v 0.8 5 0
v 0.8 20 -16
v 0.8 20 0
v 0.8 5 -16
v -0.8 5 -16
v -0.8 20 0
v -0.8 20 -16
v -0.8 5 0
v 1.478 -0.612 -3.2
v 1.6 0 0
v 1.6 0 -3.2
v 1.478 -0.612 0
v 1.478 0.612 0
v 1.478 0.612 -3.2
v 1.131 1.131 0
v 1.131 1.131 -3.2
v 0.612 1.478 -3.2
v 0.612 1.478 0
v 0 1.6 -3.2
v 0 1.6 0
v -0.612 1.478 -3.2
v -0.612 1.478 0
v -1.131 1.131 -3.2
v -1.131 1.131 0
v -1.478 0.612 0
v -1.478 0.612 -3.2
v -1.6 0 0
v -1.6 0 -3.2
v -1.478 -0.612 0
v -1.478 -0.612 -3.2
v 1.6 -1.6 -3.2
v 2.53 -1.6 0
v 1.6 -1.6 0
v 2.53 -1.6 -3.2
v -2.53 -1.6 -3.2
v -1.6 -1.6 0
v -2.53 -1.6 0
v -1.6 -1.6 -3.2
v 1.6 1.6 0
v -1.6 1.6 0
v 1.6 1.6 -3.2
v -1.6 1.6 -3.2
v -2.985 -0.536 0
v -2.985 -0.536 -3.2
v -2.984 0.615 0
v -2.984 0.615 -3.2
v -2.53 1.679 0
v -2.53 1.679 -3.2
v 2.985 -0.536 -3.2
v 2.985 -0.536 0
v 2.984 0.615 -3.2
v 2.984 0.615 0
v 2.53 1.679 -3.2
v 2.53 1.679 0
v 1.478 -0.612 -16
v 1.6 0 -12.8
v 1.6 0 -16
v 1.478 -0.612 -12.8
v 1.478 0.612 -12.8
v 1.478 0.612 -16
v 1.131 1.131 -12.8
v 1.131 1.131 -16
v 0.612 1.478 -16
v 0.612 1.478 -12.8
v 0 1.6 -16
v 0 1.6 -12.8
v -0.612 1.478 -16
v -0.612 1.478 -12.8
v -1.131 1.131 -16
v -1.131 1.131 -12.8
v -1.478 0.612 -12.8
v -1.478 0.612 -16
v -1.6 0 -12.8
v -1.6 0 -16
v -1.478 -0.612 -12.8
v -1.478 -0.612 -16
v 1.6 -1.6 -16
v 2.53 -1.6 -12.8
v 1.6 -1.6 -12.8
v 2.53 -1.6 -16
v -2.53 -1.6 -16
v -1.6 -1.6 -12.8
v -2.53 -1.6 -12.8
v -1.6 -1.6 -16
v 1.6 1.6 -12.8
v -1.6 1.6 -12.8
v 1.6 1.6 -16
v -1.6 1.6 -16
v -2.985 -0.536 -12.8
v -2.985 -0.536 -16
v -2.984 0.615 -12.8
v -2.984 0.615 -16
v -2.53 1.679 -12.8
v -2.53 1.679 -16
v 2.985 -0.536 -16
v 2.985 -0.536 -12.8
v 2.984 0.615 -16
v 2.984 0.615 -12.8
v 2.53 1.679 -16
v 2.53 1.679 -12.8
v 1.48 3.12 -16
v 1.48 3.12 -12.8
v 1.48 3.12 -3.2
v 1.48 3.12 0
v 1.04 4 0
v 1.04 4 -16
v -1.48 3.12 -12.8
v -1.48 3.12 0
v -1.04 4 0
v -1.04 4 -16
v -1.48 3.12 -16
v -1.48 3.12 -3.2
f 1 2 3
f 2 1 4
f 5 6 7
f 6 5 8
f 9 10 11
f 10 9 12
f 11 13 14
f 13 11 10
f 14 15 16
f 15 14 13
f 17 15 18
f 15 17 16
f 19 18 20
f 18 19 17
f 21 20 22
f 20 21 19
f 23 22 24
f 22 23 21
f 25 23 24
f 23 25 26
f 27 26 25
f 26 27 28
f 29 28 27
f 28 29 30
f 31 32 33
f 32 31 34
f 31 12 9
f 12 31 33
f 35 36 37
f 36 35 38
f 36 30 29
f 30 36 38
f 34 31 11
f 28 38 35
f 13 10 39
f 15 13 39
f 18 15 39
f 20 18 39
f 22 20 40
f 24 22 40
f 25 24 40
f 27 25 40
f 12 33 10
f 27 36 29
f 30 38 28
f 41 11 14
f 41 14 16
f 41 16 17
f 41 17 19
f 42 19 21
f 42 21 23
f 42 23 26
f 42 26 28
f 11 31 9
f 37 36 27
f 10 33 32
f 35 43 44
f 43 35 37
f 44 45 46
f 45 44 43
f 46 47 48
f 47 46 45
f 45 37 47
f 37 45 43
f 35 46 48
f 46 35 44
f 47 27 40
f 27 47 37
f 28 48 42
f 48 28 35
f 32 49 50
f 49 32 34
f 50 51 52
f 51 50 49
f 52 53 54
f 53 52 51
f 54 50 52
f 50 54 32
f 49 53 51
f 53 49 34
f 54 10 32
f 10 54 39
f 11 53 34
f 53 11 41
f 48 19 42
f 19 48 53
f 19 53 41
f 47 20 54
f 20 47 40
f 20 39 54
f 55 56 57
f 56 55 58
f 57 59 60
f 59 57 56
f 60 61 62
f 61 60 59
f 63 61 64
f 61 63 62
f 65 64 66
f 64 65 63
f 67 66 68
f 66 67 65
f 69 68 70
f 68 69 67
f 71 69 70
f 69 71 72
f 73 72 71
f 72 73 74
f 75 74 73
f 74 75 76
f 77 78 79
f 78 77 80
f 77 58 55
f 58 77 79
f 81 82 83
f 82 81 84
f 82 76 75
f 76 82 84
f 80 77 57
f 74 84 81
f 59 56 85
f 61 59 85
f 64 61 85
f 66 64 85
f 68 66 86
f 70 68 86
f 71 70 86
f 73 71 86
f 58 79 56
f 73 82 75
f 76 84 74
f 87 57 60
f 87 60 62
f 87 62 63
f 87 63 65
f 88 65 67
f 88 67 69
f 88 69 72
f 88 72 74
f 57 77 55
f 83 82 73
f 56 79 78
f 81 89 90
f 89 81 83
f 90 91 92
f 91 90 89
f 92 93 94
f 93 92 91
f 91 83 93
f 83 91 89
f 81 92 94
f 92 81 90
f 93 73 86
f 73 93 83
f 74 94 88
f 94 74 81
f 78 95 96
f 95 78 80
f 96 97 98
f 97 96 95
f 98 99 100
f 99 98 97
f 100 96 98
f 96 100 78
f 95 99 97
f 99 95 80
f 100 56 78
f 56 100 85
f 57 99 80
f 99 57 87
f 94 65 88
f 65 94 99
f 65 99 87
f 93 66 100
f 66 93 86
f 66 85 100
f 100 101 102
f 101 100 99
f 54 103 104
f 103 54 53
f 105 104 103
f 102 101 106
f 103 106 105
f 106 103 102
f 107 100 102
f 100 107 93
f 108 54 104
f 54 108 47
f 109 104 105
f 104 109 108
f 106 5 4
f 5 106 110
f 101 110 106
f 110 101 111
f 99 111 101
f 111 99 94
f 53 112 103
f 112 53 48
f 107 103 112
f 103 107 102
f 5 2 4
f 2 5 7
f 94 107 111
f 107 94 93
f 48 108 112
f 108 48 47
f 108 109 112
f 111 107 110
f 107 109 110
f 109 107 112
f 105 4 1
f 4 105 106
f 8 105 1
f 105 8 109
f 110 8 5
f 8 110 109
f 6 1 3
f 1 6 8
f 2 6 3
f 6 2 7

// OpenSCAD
// file: ../p/5-8edge.scad
use <../lib.scad>
function ldraw_lib__5_8edge() = [
// 0 Circle 0.625
// 0 Name: 5-8edge.dat
// 0 Author: Mark Kennedy [mkennedy]
// 0 !LDRAW_ORG Primitive UPDATE 2017-01
// 0 !LICENSE Licensed under CC BY 4.0 : see CAreadme.txt
// 
// 0 BFC CERTIFY CCW
  [0,"BFC","CERTIFY"],
  [0,"BFC","CCW"],
// 
// 0 !HISTORY 2004-04-22 [PTadmin] Official Update 2004-02
// 0 !HISTORY 2005-12-28 [PTadmin] Official Update 2005-01
// 0 !HISTORY 2007-06-24 [PTadmin] Header formatted for Contributor Agreement
// 0 !HISTORY 2008-07-01 [PTadmin] Official Update 2008-01
// 0 !HISTORY 2017-01-15 [Steffen] BFCed
// 0 !HISTORY 2017-12-30 [PTadmin] Official Update 2017-01
// 
// 
// 2 24 1 0 0 0.9239 0 0.3827
  [2,24,1,0,0,0.9239,0,0.3827],
// 2 24 0.9239 0 0.3827 0.7071 0 0.7071
  [2,24,0.9239,0,0.3827,0.7071,0,0.7071],
// 2 24 0.7071 0 0.7071 0.3827 0 0.9239
  [2,24,0.7071,0,0.7071,0.3827,0,0.9239],
// 2 24 0.3827 0 0.9239 0 0 1
  [2,24,0.3827,0,0.9239,0,0,1],
// 2 24 0 0 1 -0.3827 0 0.9239
  [2,24,0,0,1,-0.3827,0,0.9239],
// 2 24 -0.3827 0 0.9239 -0.7071 0 0.7071
  [2,24,-0.3827,0,0.9239,-0.7071,0,0.7071],
// 2 24 -0.7071 0 0.7071 -0.9239 0 0.3827
  [2,24,-0.7071,0,0.7071,-0.9239,0,0.3827],
// 2 24 -0.9239 0 0.3827 -1 0 0
  [2,24,-0.9239,0,0.3827,-1,0,0],
// 2 24 -1 0 0 -0.9239 0 -0.3827
  [2,24,-1,0,0,-0.9239,0,-0.3827],
// 2 24 -0.9239 0 -0.3827 -0.7071 0 -0.7071
  [2,24,-0.9239,0,-0.3827,-0.7071,0,-0.7071],
];
module ldraw_lib__5_8edge(step=0, col=false, unit=2/5, alt=false, line=0.2, solid=!$preview)
    makepoly(ldraw_lib__5_8edge(), step=step, col=col, unit=unit, alt=alt, line=line, solid=solid);
ldraw_lib__5_8edge(line=0.2);
// file: ../p/5-8cyli.scad
use <../lib.scad>
function ldraw_lib__5_8cyli() = [
// 0 Cylinder 0.625
// 0 Name: 5-8cyli.dat
// 0 Author: Mark Kennedy [mkennedy]
// 0 !LDRAW_ORG Primitive UPDATE 2005-01
// 0 !LICENSE Licensed under CC BY 4.0 : see CAreadme.txt
// 
// 0 BFC CERTIFY CCW
  [0,"BFC","CERTIFY"],
  [0,"BFC","CCW"],
// 
// 0 !HISTORY 2004-04-22 [PTadmin] Official Update 2004-02
// 0 !HISTORY 2004-12-11 [nielsk] Recreated using Primitive Generator, Edge lines fixed, BFC changed to CCW
// 0 !HISTORY 2005-12-28 [PTadmin] Official Update 2005-01
// 0 !HISTORY 2007-06-24 [PTadmin] Header formatted for Contributor Agreement
// 0 !HISTORY 2008-07-01 [PTadmin] Official Update 2008-01
// 
// 
// 4 16 .9239 1 .3827 .9239 0 .3827 1 0 0 1 1 0
  [4,16,.9239,1,.3827,.9239,0,.3827,1,0,0,1,1,0],
// 4 16 .7071 1 .7071 .7071 0 .7071 .9239 0 .3827 .9239 1 .3827
  [4,16,.7071,1,.7071,.7071,0,.7071,.9239,0,.3827,.9239,1,.3827],
// 4 16 .3827 1 .9239 .3827 0 .9239 .7071 0 .7071 .7071 1 .7071
  [4,16,.3827,1,.9239,.3827,0,.9239,.7071,0,.7071,.7071,1,.7071],
// 4 16 0 1 1 0 0 1 .3827 0 .9239 .3827 1 .9239
  [4,16,0,1,1,0,0,1,.3827,0,.9239,.3827,1,.9239],
// 4 16 -.3827 1 .9239 -.3827 0 .9239 0 0 1 0 1 1
  [4,16,-.3827,1,.9239,-.3827,0,.9239,0,0,1,0,1,1],
// 4 16 -.7071 1 .7071 -.7071 0 .7071 -.3827 0 .9239 -.3827 1 .9239
  [4,16,-.7071,1,.7071,-.7071,0,.7071,-.3827,0,.9239,-.3827,1,.9239],
// 4 16 -.9239 1 .3827 -.9239 0 .3827 -.7071 0 .7071 -.7071 1 .7071
  [4,16,-.9239,1,.3827,-.9239,0,.3827,-.7071,0,.7071,-.7071,1,.7071],
// 4 16 -1 1 0 -1 0 0 -.9239 0 .3827 -.9239 1 .3827
  [4,16,-1,1,0,-1,0,0,-.9239,0,.3827,-.9239,1,.3827],
// 4 16 -.9239 1 -.3827 -.9239 0 -.3827 -1 0 0 -1 1 0
  [4,16,-.9239,1,-.3827,-.9239,0,-.3827,-1,0,0,-1,1,0],
// 4 16 -.7071 1 -.7071 -.7071 0 -.7071 -.9239 0 -.3827 -.9239 1 -.3827
  [4,16,-.7071,1,-.7071,-.7071,0,-.7071,-.9239,0,-.3827,-.9239,1,-.3827],
// 0
// 5 24 1 1 0 1 0 0 1 1 -.4142 .9239 1 .3827
  [5,24,1,1,0,1,0,0,1,1,-.4142,.9239,1,.3827],
// 5 24 .9239 1 .3827 .9239 0 .3827 1 1 0 .7071 1 .7071
  [5,24,.9239,1,.3827,.9239,0,.3827,1,1,0,.7071,1,.7071],
// 5 24 .7071 1 .7071 .7071 0 .7071 .9239 1 .3827 .3827 1 .9239
  [5,24,.7071,1,.7071,.7071,0,.7071,.9239,1,.3827,.3827,1,.9239],
// 5 24 .3827 1 .9239 .3827 0 .9239 .7071 1 .7071 0 1 1
  [5,24,.3827,1,.9239,.3827,0,.9239,.7071,1,.7071,0,1,1],
// 5 24 0 1 1 0 0 1 .3827 1 .9239 -.3827 1 .9239
  [5,24,0,1,1,0,0,1,.3827,1,.9239,-.3827,1,.9239],
// 5 24 -.3827 1 .9239 -.3827 0 .9239 0 1 1 -.7071 1 .7071
  [5,24,-.3827,1,.9239,-.3827,0,.9239,0,1,1,-.7071,1,.7071],
// 5 24 -.7071 1 .7071 -.7071 0 .7071 -.3827 1 .9239 -.9239 1 .3827
  [5,24,-.7071,1,.7071,-.7071,0,.7071,-.3827,1,.9239,-.9239,1,.3827],
// 5 24 -.9239 1 .3827 -.9239 0 .3827 -.7071 1 .7071 -1 1 0
  [5,24,-.9239,1,.3827,-.9239,0,.3827,-.7071,1,.7071,-1,1,0],
// 5 24 -1 1 0 -1 0 0 -.9239 1 .3827 -.9239 1 -.3827
  [5,24,-1,1,0,-1,0,0,-.9239,1,.3827,-.9239,1,-.3827],
// 5 24 -.9239 1 -.3827 -.9239 0 -.3827 -1 1 0 -.7071 1 -.7071
  [5,24,-.9239,1,-.3827,-.9239,0,-.3827,-1,1,0,-.7071,1,-.7071],
// 5 24 -.7071 1 -.7071 -.7071 0 -.7071 -.9239 1 -.3827 -.4142 1 -1
  [5,24,-.7071,1,-.7071,-.7071,0,-.7071,-.9239,1,-.3827,-.4142,1,-1],
// 0
];
module ldraw_lib__5_8cyli(step=0, col=false, unit=2/5, alt=false, line=0.2, solid=!$preview)
    makepoly(ldraw_lib__5_8cyli(), step=step, col=col, unit=unit, alt=alt, line=line, solid=solid);
ldraw_lib__5_8cyli(line=0.2);
// file: ../p/3-16edge.scad
use <../lib.scad>
function ldraw_lib__3_16edge() = [
// 0 Circle 0.1875
// 0 Name: 3-16edge.dat
// 0 Author: Donald Sutter [technog]
// 0 !LDRAW_ORG Primitive UPDATE 2017-01
// 0 !LICENSE Licensed under CC BY 4.0 : see CAreadme.txt
// 
// 0 BFC CERTIFY CCW
  [0,"BFC","CERTIFY"],
  [0,"BFC","CCW"],
// 
// 0 !HISTORY 2004-03-02 [PTadmin] Official Update 2004-01
// 0 !HISTORY 2007-06-24 [PTadmin] Header formatted for Contributor Agreement
// 0 !HISTORY 2008-07-01 [PTadmin] Official Update 2008-01
// 0 !HISTORY 2017-01-15 [Steffen] BFCed
// 0 !HISTORY 2017-12-30 [PTadmin] Official Update 2017-01
// 
// 
// 2 24 1 0 0 0.9239 0 0.3827
  [2,24,1,0,0,0.9239,0,0.3827],
// 2 24 0.9239 0 0.3827 0.7071 0 0.7071
  [2,24,0.9239,0,0.3827,0.7071,0,0.7071],
// 2 24 0.7071 0 0.7071 0.3827 0 0.9239
  [2,24,0.7071,0,0.7071,0.3827,0,0.9239],
];
module ldraw_lib__3_16edge(step=0, col=false, unit=2/5, alt=false, line=0.2, solid=!$preview)
    makepoly(ldraw_lib__3_16edge(), step=step, col=col, unit=unit, alt=alt, line=line, solid=solid);
ldraw_lib__3_16edge(line=0.2);
// file: ../p/3-16cyli.scad
use <../lib.scad>
function ldraw_lib__3_16cyli() = [
// 0 Cylinder 0.1875
// 0 Name: 3-16cyli.dat
// 0 Author: Mark Kennedy [mkennedy]
// 0 !LDRAW_ORG Primitive UPDATE 2005-01
// 0 !LICENSE Licensed under CC BY 4.0 : see CAreadme.txt
// 
// 0 BFC CERTIFY CCW
  [0,"BFC","CERTIFY"],
  [0,"BFC","CCW"],
// 
// 0 !HISTORY 2004-03-02 [PTadmin] Official Update 2004-01
// 0 !HISTORY 2004-12-11 [nielsk] Recreated using Primitive Generator, Edge lines fixed, BFC changed to CCW
// 0 !HISTORY 2005-12-28 [PTadmin] Official Update 2005-01
// 0 !HISTORY 2007-06-24 [PTadmin] Header formatted for Contributor Agreement
// 0 !HISTORY 2008-07-01 [PTadmin] Official Update 2008-01
// 
// 
// 4 16 .9239 1 .3827 .9239 0 .3827 1 0 0 1 1 0
  [4,16,.9239,1,.3827,.9239,0,.3827,1,0,0,1,1,0],
// 4 16 .7071 1 .7071 .7071 0 .7071 .9239 0 .3827 .9239 1 .3827
  [4,16,.7071,1,.7071,.7071,0,.7071,.9239,0,.3827,.9239,1,.3827],
// 4 16 .3827 1 .9239 .3827 0 .9239 .7071 0 .7071 .7071 1 .7071
  [4,16,.3827,1,.9239,.3827,0,.9239,.7071,0,.7071,.7071,1,.7071],
// 5 24 1 1 0 1 0 0 1 1 -.4142 .9239 1 .3827
  [5,24,1,1,0,1,0,0,1,1,-.4142,.9239,1,.3827],
// 5 24 .9239 1 .3827 .9239 0 .3827 1 1 0 .7071 1 .7071
  [5,24,.9239,1,.3827,.9239,0,.3827,1,1,0,.7071,1,.7071],
// 5 24 .7071 1 .7071 .7071 0 .7071 .9239 1 .3827 .3827 1 .9239
  [5,24,.7071,1,.7071,.7071,0,.7071,.9239,1,.3827,.3827,1,.9239],
// 5 24 .3827 1 .9239 .3827 0 .9239 .7071 1 .7071 0 1 1.0824
  [5,24,.3827,1,.9239,.3827,0,.9239,.7071,1,.7071,0,1,1.0824],
// 0
];
module ldraw_lib__3_16cyli(step=0, col=false, unit=2/5, alt=false, line=0.2, solid=!$preview)
    makepoly(ldraw_lib__3_16cyli(), step=step, col=col, unit=unit, alt=alt, line=line, solid=solid);
ldraw_lib__3_16cyli(line=0.2);
// file: ../p/box2-5.scad
use <../lib.scad>
function ldraw_lib__box2_5() = [
// 0 Box with 2 Faces without 5 Edges
// 0 Name: box2-5.dat
// 0 Author: Steffen [Steffen]
// 0 !LDRAW_ORG Primitive UPDATE 2003-03
// 0 !LICENSE Licensed under CC BY 4.0 : see CAreadme.txt
// 
// 0 BFC CERTIFY CCW
  [0,"BFC","CERTIFY"],
  [0,"BFC","CCW"],
// 
// 0 !HISTORY 2003-12-19 [PTadmin] Official Update 2003-03
// 0 !HISTORY 2007-06-24 [PTadmin] Header formatted for Contributor Agreement
// 0 !HISTORY 2008-07-01 [PTadmin] Official Update 2008-01
// 
// 
// 2 24 1 1 1 -1 1 1
  [2,24,1,1,1,-1,1,1],
// 2 24 1 1 -1 -1 1 -1
  [2,24,1,1,-1,-1,1,-1],
// 2 24 1 -1 1 -1 -1 1
  [2,24,1,-1,1,-1,-1,1],
// 2 24 -1 -1 1 -1 1 1
  [2,24,-1,-1,1,-1,1,1],
// 2 24 1 -1 1 1 1 1
  [2,24,1,-1,1,1,1,1],
// 2 24 -1 1 -1 -1 1 1
  [2,24,-1,1,-1,-1,1,1],
// 2 24 1 1 -1 1 1 1
  [2,24,1,1,-1,1,1,1],
// 4 16 1 1 1 1 1 -1 -1 1 -1 -1 1 1
  [4,16,1,1,1,1,1,-1,-1,1,-1,-1,1,1],
// 4 16 1 1 1 -1 1 1 -1 -1 1 1 -1 1
  [4,16,1,1,1,-1,1,1,-1,-1,1,1,-1,1],
// 0
];
module ldraw_lib__box2_5(step=0, col=false, unit=2/5, alt=false, line=0.2, solid=!$preview)
    makepoly(ldraw_lib__box2_5(), step=step, col=col, unit=unit, alt=alt, line=line, solid=solid);
ldraw_lib__box2_5(line=0.2);
// file: ../p/5-8cylo.scad
use <../lib.scad>
use <5-8cyli.scad>
use <5-8edge.scad>
function ldraw_lib__5_8cylo() = [
// 0 Cylinder Open 0.625
// 0 Name: 5-8cylo.dat
// 0 Author: J.C. Tchang [tchang]
// 0 !LDRAW_ORG Primitive UPDATE 2013-01
// 0 !LICENSE Licensed under CC BY 4.0 : see CAreadme.txt
// 
// 0 BFC CERTIFY CCW
  [0,"BFC","CERTIFY"],
  [0,"BFC","CCW"],
// 
// 0 !HISTORY 2013-07-21 [PTadmin] Official Update 2013-01
// 
// 
// 1 16 0 0 0 1 0 0 0 1 0 0 0 1 5-8edge.dat
  [1,16,0,0,0,1,0,0,0,1,0,0,0,1, ldraw_lib__5_8edge()],
// 1 16 0 1 0 1 0 0 0 1 0 0 0 1 5-8edge.dat
  [1,16,0,1,0,1,0,0,0,1,0,0,0,1, ldraw_lib__5_8edge()],
// 1 16 0 0 0 1 0 0 0 1 0 0 0 1 5-8cyli.dat
  [1,16,0,0,0,1,0,0,0,1,0,0,0,1, ldraw_lib__5_8cyli()],
];
module ldraw_lib__5_8cylo(step=0, col=false, unit=2/5, alt=false, line=0.2, solid=!$preview)
    makepoly(ldraw_lib__5_8cylo(), step=step, col=col, unit=unit, alt=alt, line=line, solid=solid);
ldraw_lib__5_8cylo(line=0.2);
// file: ../p/3-16cylo.scad
use <../lib.scad>
use <3-16cyli.scad>
use <3-16edge.scad>
function ldraw_lib__3_16cylo() = [
// 0 Cylinder Open 0.1875
// 0 Name: 3-16cylo.dat
// 0 Author: J.C. Tchang [tchang]
// 0 !LDRAW_ORG Primitive UPDATE 2013-01
// 0 !LICENSE Licensed under CC BY 4.0 : see CAreadme.txt
// 
// 0 BFC CERTIFY CCW
  [0,"BFC","CERTIFY"],
  [0,"BFC","CCW"],
// 
// 0 !HISTORY 2013-07-21 [PTadmin] Official Update 2013-01
// 
// 
// 1 16 0 0 0 1 0 0 0 1 0 0 0 1 3-16edge.dat
  [1,16,0,0,0,1,0,0,0,1,0,0,0,1, ldraw_lib__3_16edge()],
// 1 16 0 1 0 1 0 0 0 1 0 0 0 1 3-16edge.dat
  [1,16,0,1,0,1,0,0,0,1,0,0,0,1, ldraw_lib__3_16edge()],
// 1 16 0 0 0 1 0 0 0 1 0 0 0 1 3-16cyli.dat
  [1,16,0,0,0,1,0,0,0,1,0,0,0,1, ldraw_lib__3_16cyli()],
];
module ldraw_lib__3_16cylo(step=0, col=false, unit=2/5, alt=false, line=0.2, solid=!$preview)
    makepoly(ldraw_lib__3_16cylo(), step=step, col=col, unit=unit, alt=alt, line=line, solid=solid);
ldraw_lib__3_16cylo(line=0.2);
// file: ../p/3-16chrd.scad
use <../lib.scad>
function ldraw_lib__3_16chrd() = [
// 0 Chord 0.1875
// 0 Name: 3-16chrd.dat
// 0 Author: Niels Karsdorp [nielsk]
// 0 !LDRAW_ORG Primitive UPDATE 2009-01
// 0 !LICENSE Licensed under CC BY 4.0 : see CAreadme.txt
// 
// 0 BFC CERTIFY CCW
  [0,"BFC","CERTIFY"],
  [0,"BFC","CCW"],
// 
// 0 !HISTORY 2009-05-02 [PTadmin] Official Update 2009-01
// 
// 
// 4 16 1 0 0 0.9239 0 0.3827 0.7071 0 0.7071 0.3827 0 0.9239
  [4,16,1,0,0,0.9239,0,0.3827,0.7071,0,0.7071,0.3827,0,0.9239],
// 0
// 
];
module ldraw_lib__3_16chrd(step=0, col=false, unit=2/5, alt=false, line=0.2, solid=!$preview)
    makepoly(ldraw_lib__3_16chrd(), step=step, col=col, unit=unit, alt=alt, line=line, solid=solid);
ldraw_lib__3_16chrd(line=0.2);
// file: ../p/2-4ndis.scad
use <../lib.scad>
function ldraw_lib__2_4ndis() = [
// 0 Disc Negative 0.5
// 0 Name: 2-4ndis.dat
// 0 Author: James Jessiman
// 0 !LDRAW_ORG Primitive UPDATE 2012-01
// 0 !LICENSE Licensed under CC BY 4.0 : see CAreadme.txt
// 
// 0 BFC CERTIFY CCW
  [0,"BFC","CERTIFY"],
  [0,"BFC","CCW"],
// 
// 0 !HISTORY 2002-03-23 [sbliss] Added BFC statement; compacted code
// 0 !HISTORY 2002-04-25 [PTadmin] Official Update 2002-02
// 0 !HISTORY 2007-06-24 [PTadmin] Header formatted for Contributor Agreement
// 0 !HISTORY 2008-07-01 [PTadmin] Official Update 2008-01
// 0 !HISTORY 2012-02-16 [Philo] Changed to CCW
// 0 !HISTORY 2012-03-30 [PTadmin] Official Update 2012-01
// 
// 
// 3 16 0.9239 0 0.3827 1 0 0 1 0 1
  [3,16,0.9239,0,0.3827,1,0,0,1,0,1],
// 3 16 0.7071 0 0.7071 0.9239 0 0.3827 1 0 1
  [3,16,0.7071,0,0.7071,0.9239,0,0.3827,1,0,1],
// 3 16 0.3827 0 0.9239 0.7071 0 0.7071 1 0 1
  [3,16,0.3827,0,0.9239,0.7071,0,0.7071,1,0,1],
// 3 16 0 0 1 0.3827 0 0.9239 1 0 1
  [3,16,0,0,1,0.3827,0,0.9239,1,0,1],
// 3 16 -0.3827 0 0.9239 0 0 1 -1 0 1
  [3,16,-0.3827,0,0.9239,0,0,1,-1,0,1],
// 3 16 -0.7071 0 0.7071 -0.3827 0 0.9239 -1 0 1
  [3,16,-0.7071,0,0.7071,-0.3827,0,0.9239,-1,0,1],
// 3 16 -0.9239 0 0.3827 -0.7071 0 0.7071 -1 0 1
  [3,16,-0.9239,0,0.3827,-0.7071,0,0.7071,-1,0,1],
// 3 16 -1 0 0 -0.9239 0 0.3827 -1 0 1
  [3,16,-1,0,0,-0.9239,0,0.3827,-1,0,1],
];
module ldraw_lib__2_4ndis(step=0, col=false, unit=2/5, alt=false, line=0.2, solid=!$preview)
    makepoly(ldraw_lib__2_4ndis(), step=step, col=col, unit=unit, alt=alt, line=line, solid=solid);
ldraw_lib__2_4ndis(line=0.2);
// file: ../p/1-16ndis.scad
use <../lib.scad>
function ldraw_lib__1_16ndis() = [
// 0 Disc Negative 0.0625
// 0 Name: 1-16ndis.dat
// 0 Author: Niels Karsdorp [nielsk]
// 0 !LDRAW_ORG Primitive UPDATE 2009-01
// 0 !LICENSE Licensed under CC BY 4.0 : see CAreadme.txt
// 
// 0 BFC CERTIFY CCW
  [0,"BFC","CERTIFY"],
  [0,"BFC","CCW"],
// 
// 0 !HISTORY 2009-05-02 [PTadmin] Official Update 2009-01
// 
// 
// 3 16 1 0 0 1 0 1 0.9239 0 0.3827
  [3,16,1,0,0,1,0,1,0.9239,0,0.3827],
// 0
];
module ldraw_lib__1_16ndis(step=0, col=false, unit=2/5, alt=false, line=0.2, solid=!$preview)
    makepoly(ldraw_lib__1_16ndis(), step=step, col=col, unit=unit, alt=alt, line=line, solid=solid);
ldraw_lib__1_16ndis(line=0.2);
// file: ../p/clip13.scad
use <../lib.scad>
use <1-16ndis.scad>
use <2-4ndis.scad>
use <3-16chrd.scad>
use <3-16cylo.scad>
use <5-8cylo.scad>
use <box2-5.scad>
function ldraw_lib__clip13() = [
// 0 Clip Minimal (Thick C-Clip)
// 0 Name: clip13.dat
// 0 Author: Philippe Hurbain [Philo]
// 0 !LDRAW_ORG Primitive UPDATE 2017-01
// 0 !LICENSE Licensed under CC BY 4.0 : see CAreadme.txt
// 
// 0 BFC CERTIFY CCW
  [0,"BFC","CERTIFY"],
  [0,"BFC","CCW"],
// 
// 0 !HISTORY 2017-12-30 [PTadmin] Official Update 2017-01
// 
// 
// 0 BFC INVERTNEXT
  [0,"BFC","INVERTNEXT"],
// 1 16 0 4 0 3.69552 0 1.53073 0 -8 0 -1.53073 0 3.69552 5-8cylo.dat
  [1,16,0,4,0,3.69552,0,1.53073,0,-8,0,-1.53073,0,3.69552, ldraw_lib__5_8cylo()],
// 1 16 5.011 0 -2.765 0 0.1522 -1.16272 4 0 0 0 -1.2346 0 box2-5.dat
  [1,16,5.011,0,-2.765,0,0.1522,-1.16272,4,0,0,0,-1.2346,0, ldraw_lib__box2_5()],
// 1 16 -5.011 0 -2.765 0 -0.1522 1.16272 -4 0 0 0 -1.2346 0 box2-5.dat
  [1,16,-5.011,0,-2.765,0,-0.1522,1.16272,-4,0,0,0,-1.2346,0, ldraw_lib__box2_5()],
// 3 16 6.3254 4 -4 4 4 -4 4 4 0
  [3,16,6.3254,4,-4,4,4,-4,4,4,0],
// 3 16 -4 4 0 -4 4 -4 -6.3254 4 -4
  [3,16,-4,4,0,-4,4,-4,-6.3254,4,-4],
// 1 16 0 -4 0 4 0 0 0 1 0 0 0 4 2-4ndis.dat
  [1,16,0,-4,0,4,0,0,0,1,0,0,0,4, ldraw_lib__2_4ndis()],
// 1 16 0 -4 0 4 0 0 0 1 0 0 0 -4 1-16ndis.dat
  [1,16,0,-4,0,4,0,0,0,1,0,0,0,-4, ldraw_lib__1_16ndis()],
// 1 16 0 -4 0 -4 0 0 0 1 0 0 0 -4 1-16ndis.dat
  [1,16,0,-4,0,-4,0,0,0,1,0,0,0,-4, ldraw_lib__1_16ndis()],
// 1 16 0 4 0 -4 0 0 0 -1 0 0 0 -4 1-16ndis.dat
  [1,16,0,4,0,-4,0,0,0,-1,0,0,0,-4, ldraw_lib__1_16ndis()],
// 1 16 0 4 0 4 0 0 0 -1 0 0 0 4 2-4ndis.dat
  [1,16,0,4,0,4,0,0,0,-1,0,0,0,4, ldraw_lib__2_4ndis()],
// 1 16 0 4 0 4 0 0 0 -1 0 0 0 -4 1-16ndis.dat
  [1,16,0,4,0,4,0,0,0,-1,0,0,0,-4, ldraw_lib__1_16ndis()],
// 3 16 -6.3254 -4 -4 -4 -4 -4 -4 -4 0
  [3,16,-6.3254,-4,-4,-4,-4,-4,-4,-4,0],
// 3 16 4 -4 0 4 -4 -4 6.3254 -4 -4
  [3,16,4,-4,0,4,-4,-4,6.3254,-4,-4],
// 1 16 0 -4 0.098 -6.3254 0 -4.2265 0 8 0 -4.09842 0 6.13371 3-16cylo.dat
  [1,16,0,-4,0.098,-6.3254,0,-4.2265,0,8,0,-4.09842,0,6.13371, ldraw_lib__3_16cylo()],
// 1 16 0 -4 0.098 -6.3254 0 -4.2265 0 1 0 -4.09842 0 6.13371 3-16chrd.dat
  [1,16,0,-4,0.098,-6.3254,0,-4.2265,0,1,0,-4.09842,0,6.13371, ldraw_lib__3_16chrd()],
// 1 16 0 4 0.098 -6.3254 0 -4.2265 0 -1 0 -4.09842 0 6.13371 3-16chrd.dat
  [1,16,0,4,0.098,-6.3254,0,-4.2265,0,-1,0,-4.09842,0,6.13371, ldraw_lib__3_16chrd()],
// 4 16 -6.3259 -4 -3.9996 -4.0001 -4 0 -4 -4 4 -6.3256 -4 4.1965
  [4,16,-6.3259,-4,-3.9996,-4.0001,-4,0,-4,-4,4,-6.3256,-4,4.1965],
// 4 16 -6.3259 4 -3.9996 -6.3256 4 4.1965 -4 4 4 -4.0001 4 0
  [4,16,-6.3259,4,-3.9996,-6.3256,4,4.1965,-4,4,4,-4.0001,4,0],
// 1 16 0 -4 0.098 6.3254 0 4.2265 0 8 0 -4.09842 0 6.13371 3-16cylo.dat
  [1,16,0,-4,0.098,6.3254,0,4.2265,0,8,0,-4.09842,0,6.13371, ldraw_lib__3_16cylo()],
// 1 16 0 -4 0.098 6.3254 0 4.2265 0 1 0 -4.09842 0 6.13371 3-16chrd.dat
  [1,16,0,-4,0.098,6.3254,0,4.2265,0,1,0,-4.09842,0,6.13371, ldraw_lib__3_16chrd()],
// 1 16 0 4 0.098 6.3254 0 4.2265 0 -1 0 -4.09842 0 6.13371 3-16chrd.dat
  [1,16,0,4,0.098,6.3254,0,4.2265,0,-1,0,-4.09842,0,6.13371, ldraw_lib__3_16chrd()],
// 4 16 4 -4 4 4.0001 -4 0 6.3259 -4 -3.9996 6.3256 -4 4.1965
  [4,16,4,-4,4,4.0001,-4,0,6.3259,-4,-3.9996,6.3256,-4,4.1965],
// 4 16 4 4 4 6.3256 4 4.1965 6.3259 4 -3.9996 4.0001 4 0
  [4,16,4,4,4,6.3256,4,4.1965,6.3259,4,-3.9996,4.0001,4,0],
// 4 16 0 4 4.0001 -4 4 4 -6.3256 4 4.1965 6.3256 4 4.1965
  [4,16,0,4,4.0001,-4,4,4,-6.3256,4,4.1965,6.3256,4,4.1965],
// 3 16 0 4 4.0001 6.3256 4 4.1965 4 4 4
  [3,16,0,4,4.0001,6.3256,4,4.1965,4,4,4],
// 4 16 -6.3256 -4 4.1965 -4 -4 4 0 -4 4.0001 6.3256 -4 4.1965
  [4,16,-6.3256,-4,4.1965,-4,-4,4,0,-4,4.0001,6.3256,-4,4.1965],
// 3 16 0 -4 4.0001 4 -4 4 6.3256 -4 4.1965
  [3,16,0,-4,4.0001,4,-4,4,6.3256,-4,4.1965],
];
module ldraw_lib__clip13(step=0, col=false, unit=2/5, alt=false, line=0.2, solid=!$preview)
    makepoly(ldraw_lib__clip13(), step=step, col=col, unit=unit, alt=alt, line=line, solid=solid);
ldraw_lib__clip13(line=0.2);
// file: s/80324s02.scad
use <../../lib.scad>
use <../../p/clip13.scad>
use <../../p/rect.scad>
use <../../p/rect2p.scad>
function ldraw_lib__s__80324s02() = [
// 0 ~Flag  2 x  2 - Clips and bottom side
// 0 Name: s\80324s02.dat
// 0 Author: Vincent Messenet [Cheenzo]
// 0 !LDRAW_ORG Subpart UPDATE 2024-03
// 0 !LICENSE Licensed under CC BY 4.0 : see CAreadme.txt
// 
// 0 BFC CERTIFY CCW
  [0,"BFC","CERTIFY"],
  [0,"BFC","CCW"],
// 
// 0 !HISTORY 2024-04-28 [OrionP] Official Update 2024-03
// 
// 
// 1 16 0 4 0 1 0 0 0 1 0 0 0 1 clip13.dat
  [1,16,0,4,0,1,0,0,0,1,0,0,0,1, ldraw_lib__clip13()],
// 1 16 0 36 0 1 0 0 0 1 0 0 0 1 clip13.dat
  [1,16,0,36,0,1,0,0,0,1,0,0,0,1, ldraw_lib__clip13()],
// 2 24 3.7 40 7.8 2.6 40 10
  [2,24,3.7,40,7.8,2.6,40,10],
// 2 24 2.6 40 10 2 40 12.5
  [2,24,2.6,40,10,2,40,12.5],
// 2 24 6.3256 40 4.1965 3.7 40 7.8
  [2,24,6.3256,40,4.1965,3.7,40,7.8],
// 2 24 6.3256 32 4.1965 3.7 32 7.8
  [2,24,6.3256,32,4.1965,3.7,32,7.8],
// 2 24 6.3256 8 4.1965 3.7 8 7.8
  [2,24,6.3256,8,4.1965,3.7,8,7.8],
// 2 24 6.3256 0 4.1965 3.7 0 7.8
  [2,24,6.3256,0,4.1965,3.7,0,7.8],
// 4 16 3.7 32 7.8 6.3256 32 4.1965 6.3256 40 4.1965 3.7 40 7.8
  [4,16,3.7,32,7.8,6.3256,32,4.1965,6.3256,40,4.1965,3.7,40,7.8],
// 4 16 3.7 0 7.8 6.3256 0 4.1965 6.3256 8 4.1965 3.7 8 7.8
  [4,16,3.7,0,7.8,6.3256,0,4.1965,6.3256,8,4.1965,3.7,8,7.8],
// 3 16 2.6 0 10 3.7 0 7.8 3.7 8 7.8
  [3,16,2.6,0,10,3.7,0,7.8,3.7,8,7.8],
// 3 16 3.7 32 7.8 3.7 40 7.8 2.6 40 10
  [3,16,3.7,32,7.8,3.7,40,7.8,2.6,40,10],
// 2 24 2.6 0 10 3.7 0 7.8
  [2,24,2.6,0,10,3.7,0,7.8],
// 4 16 3.7 8 7.8 3.7 32 7.8 2.6 40 10 2.6 0 10
  [4,16,3.7,8,7.8,3.7,32,7.8,2.6,40,10,2.6,0,10],
// 4 16 -3.7 32 7.8 -6.3256 32 4.1965 6.3256 32 4.1965 3.7 32 7.8
  [4,16,-3.7,32,7.8,-6.3256,32,4.1965,6.3256,32,4.1965,3.7,32,7.8],
// 4 16 6.3256 0 4.1965 3.7 0 7.8 -3.7 0 7.8 -6.3256 0 4.1965
  [4,16,6.3256,0,4.1965,3.7,0,7.8,-3.7,0,7.8,-6.3256,0,4.1965],
// 4 16 3.7 0 7.8 2.6 0 10 -2.6 0 10 -3.7 0 7.8
  [4,16,3.7,0,7.8,2.6,0,10,-2.6,0,10,-3.7,0,7.8],
// 4 16 2 40 12.5 2.6 40 10 -2.6 40 10 -2 40 12.5
  [4,16,2,40,12.5,2.6,40,10,-2.6,40,10,-2,40,12.5],
// 4 16 2.6 40 10 3.7 40 7.8 -3.7 40 7.8 -2.6 40 10
  [4,16,2.6,40,10,3.7,40,7.8,-3.7,40,7.8,-2.6,40,10],
// 4 16 3.7 40 7.8 6.3256 40 4.1965 -6.3256 40 4.1965 -3.7 40 7.8
  [4,16,3.7,40,7.8,6.3256,40,4.1965,-6.3256,40,4.1965,-3.7,40,7.8],
// 4 16 6.3256 8 4.1965 -6.3256 8 4.1965 -3.7 8 7.8 3.7 8 7.8
  [4,16,6.3256,8,4.1965,-6.3256,8,4.1965,-3.7,8,7.8,3.7,8,7.8],
// 1 16 0 20 7.8 -3.7 0 0 0 0 12 0 1 0 rect.dat
  [1,16,0,20,7.8,-3.7,0,0,0,0,12,0,1,0, ldraw_lib__rect()],
// 1 16 0 40 31.25 0 0 -2 0 -1 0 -18.75 0 0 rect2p.dat
  [1,16,0,40,31.25,0,0,-2,0,-1,0,-18.75,0,0, ldraw_lib__rect2p()],
// 2 24 -3.7 40 7.8 -2.6 40 10
  [2,24,-3.7,40,7.8,-2.6,40,10],
// 2 24 -2.6 40 10 -2 40 12.5
  [2,24,-2.6,40,10,-2,40,12.5],
// 2 24 -6.3256 40 4.1965 -3.7 40 7.8
  [2,24,-6.3256,40,4.1965,-3.7,40,7.8],
// 2 24 -6.3256 32 4.1965 -3.7 32 7.8
  [2,24,-6.3256,32,4.1965,-3.7,32,7.8],
// 2 24 -6.3256 8 4.1965 -3.7 8 7.8
  [2,24,-6.3256,8,4.1965,-3.7,8,7.8],
// 2 24 -6.3256 0 4.1965 -3.7 0 7.8
  [2,24,-6.3256,0,4.1965,-3.7,0,7.8],
// 2 24 -2.6 0 10 -3.7 0 7.8
  [2,24,-2.6,0,10,-3.7,0,7.8],
// 4 16 -6.3256 40 4.1965 -6.3256 32 4.1965 -3.7 32 7.8 -3.7 40 7.8
  [4,16,-6.3256,40,4.1965,-6.3256,32,4.1965,-3.7,32,7.8,-3.7,40,7.8],
// 4 16 -6.3256 8 4.1965 -6.3256 0 4.1965 -3.7 0 7.8 -3.7 8 7.8
  [4,16,-6.3256,8,4.1965,-6.3256,0,4.1965,-3.7,0,7.8,-3.7,8,7.8],
// 3 16 -3.7 0 7.8 -2.6 0 10 -3.7 8 7.8
  [3,16,-3.7,0,7.8,-2.6,0,10,-3.7,8,7.8],
// 3 16 -3.7 40 7.8 -3.7 32 7.8 -2.6 40 10
  [3,16,-3.7,40,7.8,-3.7,32,7.8,-2.6,40,10],
// 4 16 -2.6 40 10 -3.7 32 7.8 -3.7 8 7.8 -2.6 0 10
  [4,16,-2.6,40,10,-3.7,32,7.8,-3.7,8,7.8,-2.6,0,10],
// 5 24 3.7 32 7.8 3.7 40 7.8 2.6 40 10 6.3256 32 4.1965
  [5,24,3.7,32,7.8,3.7,40,7.8,2.6,40,10,6.3256,32,4.1965],
// 5 24 2.6 40 10 2.6 0 10 3.7 8 7.8 2 40 12.5
  [5,24,2.6,40,10,2.6,0,10,3.7,8,7.8,2,40,12.5],
// 5 24 -2.6 40 10 -2.6 0 10 -3.7 8 7.8 -2 40 12.5
  [5,24,-2.6,40,10,-2.6,0,10,-3.7,8,7.8,-2,40,12.5],
// 5 24 -3.7 8 7.8 -3.7 0 7.8 -6.3256 8 4.1965 -2.6 0 10
  [5,24,-3.7,8,7.8,-3.7,0,7.8,-6.3256,8,4.1965,-2.6,0,10],
// 5 24 3.7 0 7.8 3.7 8 7.8 6.3256 0 4.1965 2.6 0 10
  [5,24,3.7,0,7.8,3.7,8,7.8,6.3256,0,4.1965,2.6,0,10],
// 5 24 -3.7 40 7.8 -3.7 32 7.8 -2.6 40 10 -6.3256 40 4.1965
  [5,24,-3.7,40,7.8,-3.7,32,7.8,-2.6,40,10,-6.3256,40,4.1965],
// 5 24 6.3256 32 4.1965 6.3256 40 4.1965 3.7 32 7.8 7.46125 32 1.53715
  [5,24,6.3256,32,4.1965,6.3256,40,4.1965,3.7,32,7.8,7.46125,32,1.53715],
// 5 24 6.3256 0 4.1965 6.3256 8 4.1965 3.7 0 7.8 7.46125 0 1.53715
  [5,24,6.3256,0,4.1965,6.3256,8,4.1965,3.7,0,7.8,7.46125,0,1.53715],
// 5 24 -6.3256 40 4.1965 -6.3256 32 4.1965 -3.7 32 7.8 -7.46125 32 1.53715
  [5,24,-6.3256,40,4.1965,-6.3256,32,4.1965,-3.7,32,7.8,-7.46125,32,1.53715],
// 5 24 -6.3256 8 4.1965 -6.3256 0 4.1965 -3.7 0 7.8 -7.46125 0 1.53715
  [5,24,-6.3256,8,4.1965,-6.3256,0,4.1965,-3.7,0,7.8,-7.46125,0,1.53715],
];
module ldraw_lib__s__80324s02(step=0, col=false, unit=2/5, alt=false, line=0.2, solid=!$preview)
    makepoly(ldraw_lib__s__80324s02(), step=step, col=col, unit=unit, alt=alt, line=line, solid=solid);
ldraw_lib__s__80324s02(line=0.2);
// file: ../p/rect2p.scad
use <../lib.scad>
function ldraw_lib__rect2p() = [
// 0 Rectangle with 2 Parallel Edges
// 0 Name: rect2p.dat
// 0 Author: Donald Sutter [technog]
// 0 !LDRAW_ORG Primitive UPDATE 2010-01
// 0 !LICENSE Licensed under CC BY 4.0 : see CAreadme.txt
// 
// 0 BFC CERTIFY CCW
  [0,"BFC","CERTIFY"],
  [0,"BFC","CCW"],
// 
// 0 !HISTORY 2003-08-01 [PTadmin] Official Update 2003-02
// 0 !HISTORY 2007-06-24 [PTadmin] Header formatted for Contributor Agreement
// 0 !HISTORY 2008-07-01 [PTadmin] Official Update 2008-01
// 0 !HISTORY 2010-01-17 [mikeheide] changed winding to CCW
// 0 !HISTORY 2010-04-05 [PTadmin] Official Update 2010-01
// 
// 
// 2 24 1 0 1 -1 0 1
  [2,24,1,0,1,-1,0,1],
// 2 24 -1 0 -1 1 0 -1
  [2,24,-1,0,-1,1,0,-1],
// 4 16 -1 0 1 -1 0 -1 1 0 -1 1 0 1
  [4,16,-1,0,1,-1,0,-1,1,0,-1,1,0,1],
// 0
];
module ldraw_lib__rect2p(step=0, col=false, unit=2/5, alt=false, line=0.2, solid=!$preview)
    makepoly(ldraw_lib__rect2p(), step=step, col=col, unit=unit, alt=alt, line=line, solid=solid);
ldraw_lib__rect2p(line=0.2);
// file: ../p/rect.scad
use <../lib.scad>
function ldraw_lib__rect() = [
// 0 Rectangle
// 0 Name: rect.dat
// 0 Author: James Jessiman
// 0 !LDRAW_ORG Primitive UPDATE 2010-01
// 0 !LICENSE Licensed under CC BY 4.0 : see CAreadme.txt
// 
// 0 BFC CERTIFY CCW
  [0,"BFC","CERTIFY"],
  [0,"BFC","CCW"],
// 
// 0 !HISTORY 2002-04-05 [hafhead] Added BFC statement
// 0 !HISTORY 2002-04-25 [PTadmin] Official Update 2002-02
// 0 !HISTORY 2007-06-24 [PTadmin] Header formatted for Contributor Agreement
// 0 !HISTORY 2008-07-01 [PTadmin] Official Update 2008-01
// 0 !HISTORY 2010-01-17 [mikeheide] changed winding to CCW
// 0 !HISTORY 2010-04-05 [PTadmin] Official Update 2010-01
// 
// 
// 2 24 1 0 1 -1 0 1
  [2,24,1,0,1,-1,0,1],
// 2 24 -1 0 1 -1 0 -1
  [2,24,-1,0,1,-1,0,-1],
// 2 24 -1 0 -1 1 0 -1
  [2,24,-1,0,-1,1,0,-1],
// 2 24 1 0 -1 1 0 1
  [2,24,1,0,-1,1,0,1],
// 4 16 -1 0 1 -1 0 -1 1 0 -1 1 0 1
  [4,16,-1,0,1,-1,0,-1,1,0,-1,1,0,1],
// 0
];
module ldraw_lib__rect(step=0, col=false, unit=2/5, alt=false, line=0.2, solid=!$preview)
    makepoly(ldraw_lib__rect(), step=step, col=col, unit=unit, alt=alt, line=line, solid=solid);
ldraw_lib__rect(line=0.2);
// file: s/80326s01.scad
use <../../lib.scad>
use <../../p/rect.scad>
use <../../p/rect2p.scad>
use <80324s02.scad>
function ldraw_lib__s__80326s01() = [
// 0 ~Flag  2 x  2 Square with Flared Edge without Faces
// 0 Name: s\80326s01.dat
// 0 Author: Vincent Messenet [Cheenzo]
// 0 !LDRAW_ORG Subpart UPDATE 2024-03
// 0 !LICENSE Licensed under CC BY 4.0 : see CAreadme.txt
// 
// 0 BFC CERTIFY CCW
  [0,"BFC","CERTIFY"],
  [0,"BFC","CCW"],
// 
// 0 !HISTORY 2024-04-28 [OrionP] Official Update 2024-03
// 
// 
// 1 16 0 0 0 1 0 0 0 1 0 0 0 1 s\80324s02.dat
  [1,16,0,0,0,1,0,0,0,1,0,0,0,1, ldraw_lib__s__80324s02()],
// 
// 4 16 2 40 12.5 2 0 12.5 2.6 0 10 2.6 40 10
  [4,16,2,40,12.5,2,0,12.5,2.6,0,10,2.6,40,10],
// 4 16 2.6 0 10 2 0 12.5 -2 0 12.5 -2.6 0 10
  [4,16,2.6,0,10,2,0,12.5,-2,0,12.5,-2.6,0,10],
// 4 16 -2.6 0 10 -2 0 12.5 -2 40 12.5 -2.6 40 10
  [4,16,-2.6,0,10,-2,0,12.5,-2,40,12.5,-2.6,40,10],
// 1 16 0 0 31.25 0 0 -2 0 1 0 -18.75 0 0 rect2p.dat
  [1,16,0,0,31.25,0,0,-2,0,1,0,-18.75,0,0, ldraw_lib__rect2p()],
// 1 16 0 20 50 2 0 0 0 0 20 0 -1 0 rect.dat
  [1,16,0,20,50,2,0,0,0,0,20,0,-1,0, ldraw_lib__rect()],
// 2 24 2.6 0 10 2 0 12.5
  [2,24,2.6,0,10,2,0,12.5],
// 2 24 -2.6 0 10 -2 0 12.5
  [2,24,-2.6,0,10,-2,0,12.5],
// 5 24 -2.6 0 10 -2.6 40 10 -2 0 12.5 -3.7 32 7.8
  [5,24,-2.6,0,10,-2.6,40,10,-2,0,12.5,-3.7,32,7.8],
// 5 24 -2 40 12.5 -2 0 12.5 -2.6 40 10 -2 20 50
  [5,24,-2,40,12.5,-2,0,12.5,-2.6,40,10,-2,20,50],
// 5 24 2 0 12.5 2 40 12.5 2.6 0 10 2 40 50
  [5,24,2,0,12.5,2,40,12.5,2.6,0,10,2,40,50],
];
module ldraw_lib__s__80326s01(step=0, col=false, unit=2/5, alt=false, line=0.2, solid=!$preview)
    makepoly(ldraw_lib__s__80326s01(), step=step, col=col, unit=unit, alt=alt, line=line, solid=solid);
ldraw_lib__s__80326s01(line=0.2);
// main file
use <../lib.scad>
use <s/80326s01.scad>
function ldraw_lib__80326() = [
// 0 Flag  2 x  2 Square with Flared Edge
// 0 Name: 80326.dat
// 0 Author: Vincent Messenet [Cheenzo]
// 0 !LDRAW_ORG Part UPDATE 2024-03
// 0 !LICENSE Licensed under CC BY 4.0 : see CAreadme.txt
// 
// 0 BFC CERTIFY CCW
  [0,"BFC","CERTIFY"],
  [0,"BFC","CCW"],
// 
// 0 !HISTORY 2024-04-28 [OrionP] Official Update 2024-03
// 
// 
// 4 16 2 40 12.5 2 40 50 2 0 50 2 0 12.5
  [4,16,2,40,12.5,2,40,50,2,0,50,2,0,12.5],
// 4 16 -2 0 50 -2 40 50 -2 40 12.5 -2 0 12.5
  [4,16,-2,0,50,-2,40,50,-2,40,12.5,-2,0,12.5],
// 1 16 0 0 0 1 0 0 0 1 0 0 0 1 s\80326s01.dat
  [1,16,0,0,0,1,0,0,0,1,0,0,0,1, ldraw_lib__s__80326s01()],
];
module ldraw_lib__80326(step=0, col=false, unit=2/5, alt=false, line=0.2, solid=!$preview)
    makepoly(ldraw_lib__80326(), step=step, col=col, unit=unit, alt=alt, line=line, solid=solid);
ldraw_lib__80326(line=0.2);
